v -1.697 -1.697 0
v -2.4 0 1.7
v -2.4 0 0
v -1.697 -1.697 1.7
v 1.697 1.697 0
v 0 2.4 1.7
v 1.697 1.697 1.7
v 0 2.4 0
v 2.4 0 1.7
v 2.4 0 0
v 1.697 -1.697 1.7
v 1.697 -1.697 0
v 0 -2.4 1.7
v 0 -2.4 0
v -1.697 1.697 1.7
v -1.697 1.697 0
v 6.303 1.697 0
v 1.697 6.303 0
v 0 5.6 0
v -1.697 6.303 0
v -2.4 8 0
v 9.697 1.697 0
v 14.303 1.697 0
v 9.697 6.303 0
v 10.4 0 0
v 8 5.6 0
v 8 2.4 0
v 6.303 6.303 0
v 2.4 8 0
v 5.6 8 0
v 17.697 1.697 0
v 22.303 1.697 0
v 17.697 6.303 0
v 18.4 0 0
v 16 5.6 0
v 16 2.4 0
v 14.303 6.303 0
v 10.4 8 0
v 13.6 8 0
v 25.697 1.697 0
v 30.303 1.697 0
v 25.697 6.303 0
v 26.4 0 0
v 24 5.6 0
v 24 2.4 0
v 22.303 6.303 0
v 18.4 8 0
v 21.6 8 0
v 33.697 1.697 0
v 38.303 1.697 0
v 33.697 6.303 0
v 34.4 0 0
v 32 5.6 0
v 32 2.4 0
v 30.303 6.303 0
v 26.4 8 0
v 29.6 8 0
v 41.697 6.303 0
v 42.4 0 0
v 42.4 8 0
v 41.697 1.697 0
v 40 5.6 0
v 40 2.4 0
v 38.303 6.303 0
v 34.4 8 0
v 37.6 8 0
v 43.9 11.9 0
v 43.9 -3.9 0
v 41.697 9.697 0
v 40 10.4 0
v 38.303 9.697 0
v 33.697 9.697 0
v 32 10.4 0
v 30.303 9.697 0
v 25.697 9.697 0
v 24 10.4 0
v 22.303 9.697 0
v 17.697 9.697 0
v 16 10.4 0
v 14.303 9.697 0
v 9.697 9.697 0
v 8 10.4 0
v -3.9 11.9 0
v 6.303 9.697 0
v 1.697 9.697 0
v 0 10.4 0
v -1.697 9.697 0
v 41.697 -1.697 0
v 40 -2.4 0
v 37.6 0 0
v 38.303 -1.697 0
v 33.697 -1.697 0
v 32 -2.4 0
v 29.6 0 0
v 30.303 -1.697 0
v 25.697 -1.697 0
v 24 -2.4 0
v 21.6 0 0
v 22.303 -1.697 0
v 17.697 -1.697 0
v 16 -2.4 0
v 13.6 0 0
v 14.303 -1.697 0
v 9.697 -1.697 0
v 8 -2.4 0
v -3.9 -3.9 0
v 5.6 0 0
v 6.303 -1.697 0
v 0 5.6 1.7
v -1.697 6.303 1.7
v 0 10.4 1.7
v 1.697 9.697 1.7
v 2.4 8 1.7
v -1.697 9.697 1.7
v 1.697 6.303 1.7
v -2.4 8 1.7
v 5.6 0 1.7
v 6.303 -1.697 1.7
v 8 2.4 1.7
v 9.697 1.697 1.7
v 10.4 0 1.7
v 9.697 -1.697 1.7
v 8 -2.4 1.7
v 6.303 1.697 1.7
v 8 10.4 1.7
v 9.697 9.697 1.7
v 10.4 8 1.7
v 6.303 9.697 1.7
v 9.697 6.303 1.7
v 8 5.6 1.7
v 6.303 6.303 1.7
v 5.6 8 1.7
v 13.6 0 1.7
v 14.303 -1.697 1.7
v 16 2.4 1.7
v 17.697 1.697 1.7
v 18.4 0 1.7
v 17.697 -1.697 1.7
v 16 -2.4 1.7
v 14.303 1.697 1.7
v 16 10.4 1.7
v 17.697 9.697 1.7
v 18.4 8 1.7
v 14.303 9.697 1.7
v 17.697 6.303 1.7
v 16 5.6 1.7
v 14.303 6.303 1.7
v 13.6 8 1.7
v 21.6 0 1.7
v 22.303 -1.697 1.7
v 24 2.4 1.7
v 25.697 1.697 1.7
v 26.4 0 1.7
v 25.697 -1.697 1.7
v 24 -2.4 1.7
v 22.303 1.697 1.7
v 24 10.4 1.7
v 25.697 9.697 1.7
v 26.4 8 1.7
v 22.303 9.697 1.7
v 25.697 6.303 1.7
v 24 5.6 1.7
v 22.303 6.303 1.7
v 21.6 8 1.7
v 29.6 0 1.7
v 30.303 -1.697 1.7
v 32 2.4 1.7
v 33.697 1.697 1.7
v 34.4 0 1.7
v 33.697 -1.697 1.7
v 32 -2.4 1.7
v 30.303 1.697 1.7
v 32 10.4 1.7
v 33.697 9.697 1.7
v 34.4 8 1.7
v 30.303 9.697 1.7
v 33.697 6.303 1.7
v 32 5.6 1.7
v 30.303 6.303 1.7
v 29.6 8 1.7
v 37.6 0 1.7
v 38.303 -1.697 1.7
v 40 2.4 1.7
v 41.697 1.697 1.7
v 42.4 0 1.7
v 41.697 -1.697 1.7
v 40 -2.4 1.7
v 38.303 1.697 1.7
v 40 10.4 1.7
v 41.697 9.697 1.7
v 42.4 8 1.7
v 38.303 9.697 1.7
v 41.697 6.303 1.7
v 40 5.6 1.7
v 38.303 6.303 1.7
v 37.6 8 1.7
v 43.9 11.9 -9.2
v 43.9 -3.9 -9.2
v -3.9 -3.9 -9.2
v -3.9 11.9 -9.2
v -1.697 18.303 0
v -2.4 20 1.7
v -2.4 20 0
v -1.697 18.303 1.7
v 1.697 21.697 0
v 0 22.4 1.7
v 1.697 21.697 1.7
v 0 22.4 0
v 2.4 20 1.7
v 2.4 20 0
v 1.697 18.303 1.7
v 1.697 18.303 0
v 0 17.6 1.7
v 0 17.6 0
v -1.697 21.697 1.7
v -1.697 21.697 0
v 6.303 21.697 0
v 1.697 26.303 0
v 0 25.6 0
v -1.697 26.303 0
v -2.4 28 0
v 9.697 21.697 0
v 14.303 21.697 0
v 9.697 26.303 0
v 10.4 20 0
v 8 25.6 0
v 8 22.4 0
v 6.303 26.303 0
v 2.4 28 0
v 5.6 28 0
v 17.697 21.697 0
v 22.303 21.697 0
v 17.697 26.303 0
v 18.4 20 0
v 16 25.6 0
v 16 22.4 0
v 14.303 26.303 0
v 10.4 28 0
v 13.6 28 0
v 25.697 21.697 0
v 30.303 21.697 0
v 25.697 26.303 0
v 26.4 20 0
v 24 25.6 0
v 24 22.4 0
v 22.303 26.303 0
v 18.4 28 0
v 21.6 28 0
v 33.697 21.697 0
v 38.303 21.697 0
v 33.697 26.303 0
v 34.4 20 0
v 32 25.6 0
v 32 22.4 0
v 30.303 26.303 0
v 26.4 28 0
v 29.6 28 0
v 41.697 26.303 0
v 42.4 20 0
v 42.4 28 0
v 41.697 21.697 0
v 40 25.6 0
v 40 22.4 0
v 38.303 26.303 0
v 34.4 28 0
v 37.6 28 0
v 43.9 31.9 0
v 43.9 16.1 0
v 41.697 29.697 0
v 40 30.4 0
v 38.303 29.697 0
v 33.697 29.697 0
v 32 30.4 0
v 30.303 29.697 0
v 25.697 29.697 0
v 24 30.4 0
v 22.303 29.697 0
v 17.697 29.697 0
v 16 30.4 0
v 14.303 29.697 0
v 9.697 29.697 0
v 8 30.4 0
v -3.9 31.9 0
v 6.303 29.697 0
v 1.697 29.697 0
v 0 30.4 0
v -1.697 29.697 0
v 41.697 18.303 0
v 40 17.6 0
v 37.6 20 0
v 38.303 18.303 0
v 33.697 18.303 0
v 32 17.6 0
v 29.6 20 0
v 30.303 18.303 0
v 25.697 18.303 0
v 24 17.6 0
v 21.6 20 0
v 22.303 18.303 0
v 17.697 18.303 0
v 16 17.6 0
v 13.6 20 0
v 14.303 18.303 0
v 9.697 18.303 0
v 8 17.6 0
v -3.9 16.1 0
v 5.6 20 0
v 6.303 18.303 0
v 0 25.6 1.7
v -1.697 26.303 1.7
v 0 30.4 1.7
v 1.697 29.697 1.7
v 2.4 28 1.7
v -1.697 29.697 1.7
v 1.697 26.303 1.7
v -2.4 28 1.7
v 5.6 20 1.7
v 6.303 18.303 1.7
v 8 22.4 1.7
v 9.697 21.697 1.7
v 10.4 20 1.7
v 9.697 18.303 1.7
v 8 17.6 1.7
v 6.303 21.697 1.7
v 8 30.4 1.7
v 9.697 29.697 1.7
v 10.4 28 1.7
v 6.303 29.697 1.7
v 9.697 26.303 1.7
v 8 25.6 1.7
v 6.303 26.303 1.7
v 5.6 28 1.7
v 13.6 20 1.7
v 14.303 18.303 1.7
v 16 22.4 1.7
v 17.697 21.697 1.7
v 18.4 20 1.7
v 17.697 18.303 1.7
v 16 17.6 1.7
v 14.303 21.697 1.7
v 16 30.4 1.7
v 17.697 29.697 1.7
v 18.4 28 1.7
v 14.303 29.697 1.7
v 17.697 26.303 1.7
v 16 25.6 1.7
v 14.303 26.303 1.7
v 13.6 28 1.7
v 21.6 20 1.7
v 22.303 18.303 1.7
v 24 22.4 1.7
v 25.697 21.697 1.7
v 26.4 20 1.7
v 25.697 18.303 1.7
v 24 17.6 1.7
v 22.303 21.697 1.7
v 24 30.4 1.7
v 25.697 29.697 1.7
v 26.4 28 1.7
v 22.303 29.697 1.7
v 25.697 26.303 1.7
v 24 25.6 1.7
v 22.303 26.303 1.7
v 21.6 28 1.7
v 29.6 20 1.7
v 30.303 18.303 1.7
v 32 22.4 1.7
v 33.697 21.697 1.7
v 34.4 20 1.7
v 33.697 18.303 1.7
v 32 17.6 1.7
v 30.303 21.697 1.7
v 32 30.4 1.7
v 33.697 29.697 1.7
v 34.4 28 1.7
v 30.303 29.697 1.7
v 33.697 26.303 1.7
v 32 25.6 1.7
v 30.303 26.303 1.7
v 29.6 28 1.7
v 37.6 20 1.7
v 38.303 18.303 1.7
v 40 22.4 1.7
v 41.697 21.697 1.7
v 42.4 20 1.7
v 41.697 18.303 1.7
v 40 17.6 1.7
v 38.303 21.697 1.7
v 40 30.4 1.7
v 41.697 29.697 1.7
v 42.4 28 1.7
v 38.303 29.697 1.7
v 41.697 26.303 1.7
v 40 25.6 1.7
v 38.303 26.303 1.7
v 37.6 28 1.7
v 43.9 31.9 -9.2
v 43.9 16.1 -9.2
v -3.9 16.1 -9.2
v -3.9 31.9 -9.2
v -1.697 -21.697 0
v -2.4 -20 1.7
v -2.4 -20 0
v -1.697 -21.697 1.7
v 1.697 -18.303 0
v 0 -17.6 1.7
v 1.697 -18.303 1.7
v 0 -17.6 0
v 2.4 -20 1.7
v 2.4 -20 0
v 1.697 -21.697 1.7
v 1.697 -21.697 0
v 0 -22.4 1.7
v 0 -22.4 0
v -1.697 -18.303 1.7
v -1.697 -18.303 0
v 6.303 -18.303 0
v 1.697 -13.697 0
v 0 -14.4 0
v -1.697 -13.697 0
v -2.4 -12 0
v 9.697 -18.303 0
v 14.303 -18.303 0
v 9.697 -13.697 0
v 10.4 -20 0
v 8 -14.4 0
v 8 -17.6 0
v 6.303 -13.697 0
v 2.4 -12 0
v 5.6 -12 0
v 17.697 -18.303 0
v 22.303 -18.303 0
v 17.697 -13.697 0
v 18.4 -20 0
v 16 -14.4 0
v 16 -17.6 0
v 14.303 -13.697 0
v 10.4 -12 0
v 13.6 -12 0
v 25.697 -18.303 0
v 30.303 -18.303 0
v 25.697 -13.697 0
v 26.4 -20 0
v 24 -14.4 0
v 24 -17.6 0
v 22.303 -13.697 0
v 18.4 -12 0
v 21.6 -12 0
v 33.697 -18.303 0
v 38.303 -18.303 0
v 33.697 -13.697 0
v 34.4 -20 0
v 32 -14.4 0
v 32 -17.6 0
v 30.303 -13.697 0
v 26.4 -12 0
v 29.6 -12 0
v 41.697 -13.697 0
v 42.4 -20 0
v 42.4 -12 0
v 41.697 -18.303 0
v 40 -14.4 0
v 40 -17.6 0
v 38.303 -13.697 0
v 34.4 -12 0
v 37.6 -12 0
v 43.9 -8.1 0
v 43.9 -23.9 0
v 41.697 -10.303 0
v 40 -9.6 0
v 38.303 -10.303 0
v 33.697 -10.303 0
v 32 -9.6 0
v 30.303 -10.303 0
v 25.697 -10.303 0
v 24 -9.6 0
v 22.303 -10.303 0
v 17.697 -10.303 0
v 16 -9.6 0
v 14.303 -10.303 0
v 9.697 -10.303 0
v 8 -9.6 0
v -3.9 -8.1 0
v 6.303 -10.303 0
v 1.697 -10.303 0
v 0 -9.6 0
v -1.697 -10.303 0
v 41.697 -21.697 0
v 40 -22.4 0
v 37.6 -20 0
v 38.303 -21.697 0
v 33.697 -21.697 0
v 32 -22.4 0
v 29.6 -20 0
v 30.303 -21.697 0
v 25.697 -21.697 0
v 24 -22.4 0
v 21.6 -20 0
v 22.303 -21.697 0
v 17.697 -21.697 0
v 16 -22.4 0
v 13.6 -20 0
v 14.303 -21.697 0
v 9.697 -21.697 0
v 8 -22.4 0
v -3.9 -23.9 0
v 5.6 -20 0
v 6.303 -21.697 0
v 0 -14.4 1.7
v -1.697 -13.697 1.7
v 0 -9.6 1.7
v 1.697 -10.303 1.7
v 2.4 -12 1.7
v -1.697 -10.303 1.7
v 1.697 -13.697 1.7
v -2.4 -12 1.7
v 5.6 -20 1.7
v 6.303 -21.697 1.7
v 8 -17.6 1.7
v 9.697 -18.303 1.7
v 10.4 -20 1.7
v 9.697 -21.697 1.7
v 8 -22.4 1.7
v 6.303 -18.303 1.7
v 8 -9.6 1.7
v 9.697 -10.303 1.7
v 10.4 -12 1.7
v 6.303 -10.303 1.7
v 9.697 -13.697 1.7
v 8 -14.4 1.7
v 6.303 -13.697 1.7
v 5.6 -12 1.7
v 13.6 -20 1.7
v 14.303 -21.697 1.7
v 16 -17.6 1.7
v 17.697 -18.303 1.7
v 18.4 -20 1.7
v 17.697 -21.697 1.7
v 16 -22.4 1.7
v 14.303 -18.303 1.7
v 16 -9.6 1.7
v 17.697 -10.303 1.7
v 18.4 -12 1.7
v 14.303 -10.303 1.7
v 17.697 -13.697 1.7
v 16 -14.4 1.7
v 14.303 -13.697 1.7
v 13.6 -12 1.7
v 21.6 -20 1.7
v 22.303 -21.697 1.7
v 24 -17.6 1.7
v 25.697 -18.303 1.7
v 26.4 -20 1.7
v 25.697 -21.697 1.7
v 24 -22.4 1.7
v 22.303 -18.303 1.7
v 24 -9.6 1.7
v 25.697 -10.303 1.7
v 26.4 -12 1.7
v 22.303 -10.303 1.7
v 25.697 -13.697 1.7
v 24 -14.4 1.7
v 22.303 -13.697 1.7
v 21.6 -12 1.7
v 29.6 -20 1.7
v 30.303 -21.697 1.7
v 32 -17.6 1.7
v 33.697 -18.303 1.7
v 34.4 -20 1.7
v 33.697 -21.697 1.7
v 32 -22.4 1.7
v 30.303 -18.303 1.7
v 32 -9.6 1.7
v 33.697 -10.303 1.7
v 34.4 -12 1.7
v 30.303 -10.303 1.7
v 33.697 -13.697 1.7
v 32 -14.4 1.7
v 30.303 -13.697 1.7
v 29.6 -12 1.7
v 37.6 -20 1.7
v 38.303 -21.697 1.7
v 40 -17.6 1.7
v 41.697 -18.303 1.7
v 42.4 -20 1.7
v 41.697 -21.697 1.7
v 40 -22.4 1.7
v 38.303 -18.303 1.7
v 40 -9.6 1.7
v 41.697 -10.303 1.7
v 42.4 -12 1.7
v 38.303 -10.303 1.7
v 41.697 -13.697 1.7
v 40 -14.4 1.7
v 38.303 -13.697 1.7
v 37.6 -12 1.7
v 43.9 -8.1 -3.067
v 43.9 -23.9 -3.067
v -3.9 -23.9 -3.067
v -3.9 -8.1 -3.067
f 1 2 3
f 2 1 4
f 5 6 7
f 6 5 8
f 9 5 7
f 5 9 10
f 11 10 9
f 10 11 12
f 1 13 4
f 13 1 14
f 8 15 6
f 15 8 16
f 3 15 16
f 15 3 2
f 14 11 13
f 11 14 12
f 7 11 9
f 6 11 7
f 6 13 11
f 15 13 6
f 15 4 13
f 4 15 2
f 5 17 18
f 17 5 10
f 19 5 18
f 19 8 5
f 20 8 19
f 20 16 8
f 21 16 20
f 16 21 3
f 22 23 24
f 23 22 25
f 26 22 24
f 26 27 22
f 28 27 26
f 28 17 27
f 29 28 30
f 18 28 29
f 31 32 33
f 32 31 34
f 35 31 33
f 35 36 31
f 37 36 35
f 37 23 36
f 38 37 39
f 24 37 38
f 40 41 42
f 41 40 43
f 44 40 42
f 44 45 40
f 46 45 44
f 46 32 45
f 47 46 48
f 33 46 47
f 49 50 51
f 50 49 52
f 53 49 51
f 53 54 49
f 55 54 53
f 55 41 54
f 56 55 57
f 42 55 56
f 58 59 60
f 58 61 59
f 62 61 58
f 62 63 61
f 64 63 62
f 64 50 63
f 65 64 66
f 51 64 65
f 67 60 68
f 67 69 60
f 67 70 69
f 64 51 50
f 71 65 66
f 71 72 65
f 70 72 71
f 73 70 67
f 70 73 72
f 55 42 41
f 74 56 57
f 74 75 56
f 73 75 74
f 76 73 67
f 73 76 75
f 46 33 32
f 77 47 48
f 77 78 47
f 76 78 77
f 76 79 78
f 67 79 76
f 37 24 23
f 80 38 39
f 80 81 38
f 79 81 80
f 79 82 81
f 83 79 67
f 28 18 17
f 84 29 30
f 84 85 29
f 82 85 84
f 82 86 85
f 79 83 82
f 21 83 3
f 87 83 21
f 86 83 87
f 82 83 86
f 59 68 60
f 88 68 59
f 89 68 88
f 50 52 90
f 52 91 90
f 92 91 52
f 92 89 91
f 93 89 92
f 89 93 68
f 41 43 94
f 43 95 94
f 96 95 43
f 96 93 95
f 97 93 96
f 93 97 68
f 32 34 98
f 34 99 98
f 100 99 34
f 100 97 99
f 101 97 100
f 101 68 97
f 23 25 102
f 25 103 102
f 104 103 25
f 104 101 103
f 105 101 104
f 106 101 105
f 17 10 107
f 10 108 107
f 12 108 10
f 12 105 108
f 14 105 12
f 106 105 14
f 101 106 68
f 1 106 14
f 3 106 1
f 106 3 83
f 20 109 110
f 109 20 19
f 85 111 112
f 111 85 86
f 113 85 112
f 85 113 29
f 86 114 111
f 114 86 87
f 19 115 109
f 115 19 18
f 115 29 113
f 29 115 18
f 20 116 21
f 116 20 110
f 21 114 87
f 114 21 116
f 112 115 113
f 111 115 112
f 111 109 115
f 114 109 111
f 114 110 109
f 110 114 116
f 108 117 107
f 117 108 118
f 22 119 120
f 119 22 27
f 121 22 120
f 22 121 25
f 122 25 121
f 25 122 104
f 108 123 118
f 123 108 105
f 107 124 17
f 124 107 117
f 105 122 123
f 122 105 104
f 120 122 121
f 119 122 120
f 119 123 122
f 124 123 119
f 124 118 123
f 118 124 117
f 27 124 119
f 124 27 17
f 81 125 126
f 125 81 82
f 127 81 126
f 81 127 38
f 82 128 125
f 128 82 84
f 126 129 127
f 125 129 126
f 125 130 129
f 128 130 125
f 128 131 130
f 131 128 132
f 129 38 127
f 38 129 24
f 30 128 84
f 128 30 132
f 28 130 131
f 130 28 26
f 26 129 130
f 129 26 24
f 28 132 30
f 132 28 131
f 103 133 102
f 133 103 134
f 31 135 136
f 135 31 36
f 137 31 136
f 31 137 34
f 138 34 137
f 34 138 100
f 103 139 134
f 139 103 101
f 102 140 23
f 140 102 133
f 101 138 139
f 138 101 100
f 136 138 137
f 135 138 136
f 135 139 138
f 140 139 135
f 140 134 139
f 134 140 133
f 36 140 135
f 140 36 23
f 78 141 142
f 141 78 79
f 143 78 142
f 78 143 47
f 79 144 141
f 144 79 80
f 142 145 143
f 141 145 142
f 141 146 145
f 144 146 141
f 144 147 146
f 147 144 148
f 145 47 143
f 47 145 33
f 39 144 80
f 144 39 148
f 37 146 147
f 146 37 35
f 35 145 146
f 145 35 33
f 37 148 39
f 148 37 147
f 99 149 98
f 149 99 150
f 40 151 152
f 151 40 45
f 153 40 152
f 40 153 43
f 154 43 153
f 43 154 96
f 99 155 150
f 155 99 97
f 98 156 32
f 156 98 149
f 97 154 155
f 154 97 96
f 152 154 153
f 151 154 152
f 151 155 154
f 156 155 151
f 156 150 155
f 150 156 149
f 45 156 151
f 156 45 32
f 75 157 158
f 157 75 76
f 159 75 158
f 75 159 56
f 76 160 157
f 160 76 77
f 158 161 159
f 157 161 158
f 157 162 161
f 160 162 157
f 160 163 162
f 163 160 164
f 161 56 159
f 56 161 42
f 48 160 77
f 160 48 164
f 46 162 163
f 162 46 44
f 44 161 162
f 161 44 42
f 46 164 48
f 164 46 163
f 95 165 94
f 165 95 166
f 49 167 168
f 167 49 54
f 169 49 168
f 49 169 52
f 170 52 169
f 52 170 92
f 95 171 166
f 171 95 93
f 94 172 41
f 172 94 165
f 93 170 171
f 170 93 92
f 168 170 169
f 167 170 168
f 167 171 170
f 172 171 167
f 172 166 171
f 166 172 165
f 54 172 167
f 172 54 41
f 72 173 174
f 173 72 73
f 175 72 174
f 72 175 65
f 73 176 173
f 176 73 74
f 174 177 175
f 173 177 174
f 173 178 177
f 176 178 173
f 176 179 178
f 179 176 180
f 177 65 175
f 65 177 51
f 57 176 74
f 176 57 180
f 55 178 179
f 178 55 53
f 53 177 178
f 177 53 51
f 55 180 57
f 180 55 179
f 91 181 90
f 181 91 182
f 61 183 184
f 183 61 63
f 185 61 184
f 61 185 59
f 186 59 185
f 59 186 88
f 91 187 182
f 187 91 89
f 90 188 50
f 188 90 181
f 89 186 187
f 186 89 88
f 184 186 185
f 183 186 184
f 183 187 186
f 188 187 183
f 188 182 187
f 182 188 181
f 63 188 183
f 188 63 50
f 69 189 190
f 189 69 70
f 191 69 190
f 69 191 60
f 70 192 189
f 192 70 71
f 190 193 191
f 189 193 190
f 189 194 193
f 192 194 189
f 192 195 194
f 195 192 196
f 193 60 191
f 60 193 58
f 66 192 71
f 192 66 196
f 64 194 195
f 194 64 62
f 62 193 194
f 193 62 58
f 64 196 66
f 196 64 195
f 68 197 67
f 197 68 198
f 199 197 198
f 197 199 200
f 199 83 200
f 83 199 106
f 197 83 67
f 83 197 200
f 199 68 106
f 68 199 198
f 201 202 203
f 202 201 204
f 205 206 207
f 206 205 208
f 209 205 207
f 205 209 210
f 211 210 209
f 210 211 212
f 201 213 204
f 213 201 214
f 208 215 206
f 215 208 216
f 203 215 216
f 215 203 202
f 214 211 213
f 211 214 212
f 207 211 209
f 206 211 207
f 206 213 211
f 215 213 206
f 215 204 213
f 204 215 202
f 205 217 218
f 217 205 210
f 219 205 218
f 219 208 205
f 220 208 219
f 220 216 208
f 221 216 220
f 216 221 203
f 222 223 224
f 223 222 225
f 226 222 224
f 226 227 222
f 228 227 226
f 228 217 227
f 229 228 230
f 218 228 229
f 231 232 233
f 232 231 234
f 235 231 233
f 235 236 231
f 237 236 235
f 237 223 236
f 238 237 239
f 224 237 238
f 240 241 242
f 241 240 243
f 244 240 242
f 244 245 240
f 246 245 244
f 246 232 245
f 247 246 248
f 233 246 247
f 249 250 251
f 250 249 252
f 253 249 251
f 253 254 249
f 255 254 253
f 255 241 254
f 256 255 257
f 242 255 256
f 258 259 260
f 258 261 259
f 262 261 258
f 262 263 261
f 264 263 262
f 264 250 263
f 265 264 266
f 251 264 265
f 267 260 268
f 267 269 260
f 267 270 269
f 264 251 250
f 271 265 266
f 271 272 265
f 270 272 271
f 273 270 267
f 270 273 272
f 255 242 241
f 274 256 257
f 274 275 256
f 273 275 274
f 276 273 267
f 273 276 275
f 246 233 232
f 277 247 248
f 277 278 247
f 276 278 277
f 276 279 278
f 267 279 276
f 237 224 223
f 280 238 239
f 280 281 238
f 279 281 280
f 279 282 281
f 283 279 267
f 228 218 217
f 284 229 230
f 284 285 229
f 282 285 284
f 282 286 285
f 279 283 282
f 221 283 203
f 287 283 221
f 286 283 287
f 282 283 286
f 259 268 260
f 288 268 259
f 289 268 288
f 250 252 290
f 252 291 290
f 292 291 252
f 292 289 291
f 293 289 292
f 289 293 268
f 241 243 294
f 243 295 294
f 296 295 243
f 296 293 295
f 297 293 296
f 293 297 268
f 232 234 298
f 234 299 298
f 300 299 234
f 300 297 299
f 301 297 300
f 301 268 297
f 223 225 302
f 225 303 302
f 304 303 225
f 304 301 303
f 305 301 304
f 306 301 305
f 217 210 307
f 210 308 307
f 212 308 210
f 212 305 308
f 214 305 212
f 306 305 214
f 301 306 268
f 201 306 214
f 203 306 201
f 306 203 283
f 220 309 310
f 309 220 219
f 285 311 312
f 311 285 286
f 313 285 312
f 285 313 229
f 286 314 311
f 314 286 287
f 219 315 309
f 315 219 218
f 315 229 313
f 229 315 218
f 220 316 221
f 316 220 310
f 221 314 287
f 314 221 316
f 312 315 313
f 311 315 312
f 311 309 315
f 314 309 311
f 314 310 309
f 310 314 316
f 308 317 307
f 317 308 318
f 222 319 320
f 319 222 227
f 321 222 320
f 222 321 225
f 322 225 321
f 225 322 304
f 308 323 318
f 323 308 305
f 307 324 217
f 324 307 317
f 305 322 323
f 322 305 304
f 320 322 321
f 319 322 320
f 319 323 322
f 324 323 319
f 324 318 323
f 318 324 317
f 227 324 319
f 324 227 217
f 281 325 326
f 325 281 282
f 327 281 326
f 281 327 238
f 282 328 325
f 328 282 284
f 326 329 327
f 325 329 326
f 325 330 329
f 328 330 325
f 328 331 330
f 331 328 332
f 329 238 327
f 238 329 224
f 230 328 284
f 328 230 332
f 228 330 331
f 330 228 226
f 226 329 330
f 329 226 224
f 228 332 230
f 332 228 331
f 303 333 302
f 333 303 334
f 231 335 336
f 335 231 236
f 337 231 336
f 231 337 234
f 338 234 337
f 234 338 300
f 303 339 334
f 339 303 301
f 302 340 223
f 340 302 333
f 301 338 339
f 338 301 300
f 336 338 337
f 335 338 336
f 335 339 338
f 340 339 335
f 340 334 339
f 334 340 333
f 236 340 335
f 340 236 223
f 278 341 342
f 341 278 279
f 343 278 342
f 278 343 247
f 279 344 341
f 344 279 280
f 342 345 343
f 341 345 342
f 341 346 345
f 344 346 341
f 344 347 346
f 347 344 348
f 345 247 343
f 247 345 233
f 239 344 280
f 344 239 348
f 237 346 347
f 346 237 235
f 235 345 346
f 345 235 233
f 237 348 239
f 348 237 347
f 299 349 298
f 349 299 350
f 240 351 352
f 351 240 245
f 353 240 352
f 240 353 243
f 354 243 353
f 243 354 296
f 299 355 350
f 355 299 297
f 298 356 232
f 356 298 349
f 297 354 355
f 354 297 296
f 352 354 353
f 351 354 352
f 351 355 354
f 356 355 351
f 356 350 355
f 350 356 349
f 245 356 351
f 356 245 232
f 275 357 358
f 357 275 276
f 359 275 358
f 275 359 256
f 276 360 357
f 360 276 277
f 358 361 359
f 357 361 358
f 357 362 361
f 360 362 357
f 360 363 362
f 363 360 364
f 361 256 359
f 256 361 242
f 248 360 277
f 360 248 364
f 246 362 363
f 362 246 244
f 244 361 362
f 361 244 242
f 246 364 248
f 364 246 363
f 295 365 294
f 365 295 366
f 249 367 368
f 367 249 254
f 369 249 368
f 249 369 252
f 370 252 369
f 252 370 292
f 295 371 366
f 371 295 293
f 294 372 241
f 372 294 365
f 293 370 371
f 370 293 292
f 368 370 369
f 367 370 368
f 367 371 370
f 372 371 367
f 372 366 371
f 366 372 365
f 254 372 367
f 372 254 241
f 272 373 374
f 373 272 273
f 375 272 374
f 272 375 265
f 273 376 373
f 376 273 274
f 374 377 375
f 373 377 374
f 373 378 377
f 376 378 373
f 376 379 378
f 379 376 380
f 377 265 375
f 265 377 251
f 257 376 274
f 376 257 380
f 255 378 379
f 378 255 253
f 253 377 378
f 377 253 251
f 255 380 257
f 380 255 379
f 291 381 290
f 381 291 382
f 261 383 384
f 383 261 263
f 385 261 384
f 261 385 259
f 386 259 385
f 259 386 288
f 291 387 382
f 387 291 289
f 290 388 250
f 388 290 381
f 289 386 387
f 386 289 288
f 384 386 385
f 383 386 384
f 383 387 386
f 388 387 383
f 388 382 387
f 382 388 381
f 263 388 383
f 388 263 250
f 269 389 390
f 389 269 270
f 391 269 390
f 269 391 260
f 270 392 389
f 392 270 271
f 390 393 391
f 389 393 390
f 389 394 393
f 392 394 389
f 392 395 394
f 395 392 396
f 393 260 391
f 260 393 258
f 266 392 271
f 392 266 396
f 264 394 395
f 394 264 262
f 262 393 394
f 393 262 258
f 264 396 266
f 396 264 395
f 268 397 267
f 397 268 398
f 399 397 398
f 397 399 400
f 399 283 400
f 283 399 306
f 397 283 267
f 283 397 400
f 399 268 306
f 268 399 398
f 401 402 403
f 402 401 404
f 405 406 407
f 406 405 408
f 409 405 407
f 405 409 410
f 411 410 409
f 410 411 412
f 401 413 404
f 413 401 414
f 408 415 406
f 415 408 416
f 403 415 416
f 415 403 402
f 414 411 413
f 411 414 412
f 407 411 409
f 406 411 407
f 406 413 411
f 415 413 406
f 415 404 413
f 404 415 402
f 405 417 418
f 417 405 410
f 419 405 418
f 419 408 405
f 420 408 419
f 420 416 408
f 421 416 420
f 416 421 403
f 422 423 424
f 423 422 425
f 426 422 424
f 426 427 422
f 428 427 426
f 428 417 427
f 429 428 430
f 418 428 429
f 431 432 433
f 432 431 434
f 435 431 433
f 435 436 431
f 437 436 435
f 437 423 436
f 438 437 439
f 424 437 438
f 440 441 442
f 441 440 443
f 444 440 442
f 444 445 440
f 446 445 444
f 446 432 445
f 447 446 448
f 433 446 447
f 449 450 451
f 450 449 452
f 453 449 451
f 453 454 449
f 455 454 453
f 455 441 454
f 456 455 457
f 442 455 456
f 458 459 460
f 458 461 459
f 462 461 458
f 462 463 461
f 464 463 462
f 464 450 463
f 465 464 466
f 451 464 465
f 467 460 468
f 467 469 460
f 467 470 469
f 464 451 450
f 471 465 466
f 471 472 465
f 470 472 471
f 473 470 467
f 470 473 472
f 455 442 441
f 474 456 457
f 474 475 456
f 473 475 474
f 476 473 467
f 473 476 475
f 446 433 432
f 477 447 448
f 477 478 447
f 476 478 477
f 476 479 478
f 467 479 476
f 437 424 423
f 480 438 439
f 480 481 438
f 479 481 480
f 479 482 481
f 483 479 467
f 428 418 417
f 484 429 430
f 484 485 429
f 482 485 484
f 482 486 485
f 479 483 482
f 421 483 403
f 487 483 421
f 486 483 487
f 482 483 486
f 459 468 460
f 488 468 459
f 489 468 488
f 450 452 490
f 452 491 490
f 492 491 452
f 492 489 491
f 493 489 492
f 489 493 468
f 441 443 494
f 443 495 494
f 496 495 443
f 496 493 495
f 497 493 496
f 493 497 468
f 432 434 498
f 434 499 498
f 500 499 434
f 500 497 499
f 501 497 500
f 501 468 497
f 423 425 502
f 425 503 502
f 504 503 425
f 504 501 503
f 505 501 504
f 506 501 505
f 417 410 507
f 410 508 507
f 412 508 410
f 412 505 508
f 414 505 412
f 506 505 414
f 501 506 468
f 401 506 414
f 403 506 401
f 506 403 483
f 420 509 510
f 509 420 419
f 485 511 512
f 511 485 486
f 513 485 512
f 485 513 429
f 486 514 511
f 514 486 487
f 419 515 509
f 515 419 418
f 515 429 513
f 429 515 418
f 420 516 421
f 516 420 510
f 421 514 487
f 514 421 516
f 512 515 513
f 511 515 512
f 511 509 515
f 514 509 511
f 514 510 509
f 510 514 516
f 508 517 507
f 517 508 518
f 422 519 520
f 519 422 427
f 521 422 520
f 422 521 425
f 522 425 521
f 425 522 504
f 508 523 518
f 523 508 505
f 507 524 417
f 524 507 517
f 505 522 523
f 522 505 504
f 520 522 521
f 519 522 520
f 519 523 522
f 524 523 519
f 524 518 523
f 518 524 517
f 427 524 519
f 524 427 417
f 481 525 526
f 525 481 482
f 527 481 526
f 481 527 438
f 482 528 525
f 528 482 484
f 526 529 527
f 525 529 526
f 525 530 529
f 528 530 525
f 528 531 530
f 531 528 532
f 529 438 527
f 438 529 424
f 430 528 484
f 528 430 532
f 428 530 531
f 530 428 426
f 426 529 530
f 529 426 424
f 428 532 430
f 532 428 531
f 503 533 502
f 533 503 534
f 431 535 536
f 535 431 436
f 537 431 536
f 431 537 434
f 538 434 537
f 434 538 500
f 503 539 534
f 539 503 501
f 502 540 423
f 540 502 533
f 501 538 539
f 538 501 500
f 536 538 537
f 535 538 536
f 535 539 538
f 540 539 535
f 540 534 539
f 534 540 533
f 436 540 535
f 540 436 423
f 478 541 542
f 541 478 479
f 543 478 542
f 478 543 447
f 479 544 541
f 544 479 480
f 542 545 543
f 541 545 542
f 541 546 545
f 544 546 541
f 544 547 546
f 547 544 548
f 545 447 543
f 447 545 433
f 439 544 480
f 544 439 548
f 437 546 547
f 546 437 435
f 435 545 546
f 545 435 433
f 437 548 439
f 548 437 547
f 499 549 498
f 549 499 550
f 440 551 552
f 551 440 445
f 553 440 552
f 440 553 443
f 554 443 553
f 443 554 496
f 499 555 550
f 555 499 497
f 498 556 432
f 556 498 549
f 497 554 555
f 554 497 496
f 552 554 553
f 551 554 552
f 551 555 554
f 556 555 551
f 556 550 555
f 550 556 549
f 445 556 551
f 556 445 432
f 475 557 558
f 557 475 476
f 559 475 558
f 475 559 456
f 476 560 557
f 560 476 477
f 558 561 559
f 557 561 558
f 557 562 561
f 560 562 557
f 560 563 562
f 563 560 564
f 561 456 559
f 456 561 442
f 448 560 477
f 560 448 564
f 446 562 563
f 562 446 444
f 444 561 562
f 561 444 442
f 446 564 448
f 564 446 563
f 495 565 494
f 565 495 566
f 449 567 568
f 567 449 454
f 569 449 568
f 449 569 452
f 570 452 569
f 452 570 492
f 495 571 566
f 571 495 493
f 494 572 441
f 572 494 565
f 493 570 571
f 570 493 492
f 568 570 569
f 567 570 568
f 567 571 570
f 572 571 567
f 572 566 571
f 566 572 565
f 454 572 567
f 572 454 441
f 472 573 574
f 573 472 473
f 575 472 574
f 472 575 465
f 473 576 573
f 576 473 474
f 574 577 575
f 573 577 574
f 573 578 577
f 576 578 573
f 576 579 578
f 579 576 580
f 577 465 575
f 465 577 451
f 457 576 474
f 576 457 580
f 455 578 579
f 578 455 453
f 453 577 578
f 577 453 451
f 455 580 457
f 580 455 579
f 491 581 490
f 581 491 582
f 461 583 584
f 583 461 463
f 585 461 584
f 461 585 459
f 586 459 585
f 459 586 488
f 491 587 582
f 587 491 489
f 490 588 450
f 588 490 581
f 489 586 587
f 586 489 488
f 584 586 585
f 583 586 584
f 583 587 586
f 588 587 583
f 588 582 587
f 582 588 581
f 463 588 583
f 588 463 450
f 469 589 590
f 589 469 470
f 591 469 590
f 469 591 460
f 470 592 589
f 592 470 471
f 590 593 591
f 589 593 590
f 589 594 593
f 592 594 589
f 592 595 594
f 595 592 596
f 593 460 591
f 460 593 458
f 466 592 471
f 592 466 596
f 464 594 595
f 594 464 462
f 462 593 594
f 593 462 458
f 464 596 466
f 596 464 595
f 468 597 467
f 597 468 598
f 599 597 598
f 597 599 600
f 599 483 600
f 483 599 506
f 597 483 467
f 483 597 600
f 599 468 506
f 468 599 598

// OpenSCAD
// type = 1 - high
// type = 0 - low
// type = undef - high
module Lego_block(x, y, type)
{
    height=9.2;

    if(type==1)
        translate([-3.9, -3.9, -height/3])
            cube(size=[x*8-0.2, y*8-0.2, height/3]);
    else
        translate([-3.9, -3.9, -height])
            cube(size=[x*8-0.2, y*8-0.2, height]);

    for (x=[0:x-1])for (y=[0:y-1])
        translate([x*8,y*8, 0])cylinder(d=4.8, h=1.7);
}


translate([0, 20, 0]) 
color("green")Lego_block(6,2);
translate([0, -20, 0]) 
Lego_block(6,2,1);
color("red")Lego_block(6,2,0);
